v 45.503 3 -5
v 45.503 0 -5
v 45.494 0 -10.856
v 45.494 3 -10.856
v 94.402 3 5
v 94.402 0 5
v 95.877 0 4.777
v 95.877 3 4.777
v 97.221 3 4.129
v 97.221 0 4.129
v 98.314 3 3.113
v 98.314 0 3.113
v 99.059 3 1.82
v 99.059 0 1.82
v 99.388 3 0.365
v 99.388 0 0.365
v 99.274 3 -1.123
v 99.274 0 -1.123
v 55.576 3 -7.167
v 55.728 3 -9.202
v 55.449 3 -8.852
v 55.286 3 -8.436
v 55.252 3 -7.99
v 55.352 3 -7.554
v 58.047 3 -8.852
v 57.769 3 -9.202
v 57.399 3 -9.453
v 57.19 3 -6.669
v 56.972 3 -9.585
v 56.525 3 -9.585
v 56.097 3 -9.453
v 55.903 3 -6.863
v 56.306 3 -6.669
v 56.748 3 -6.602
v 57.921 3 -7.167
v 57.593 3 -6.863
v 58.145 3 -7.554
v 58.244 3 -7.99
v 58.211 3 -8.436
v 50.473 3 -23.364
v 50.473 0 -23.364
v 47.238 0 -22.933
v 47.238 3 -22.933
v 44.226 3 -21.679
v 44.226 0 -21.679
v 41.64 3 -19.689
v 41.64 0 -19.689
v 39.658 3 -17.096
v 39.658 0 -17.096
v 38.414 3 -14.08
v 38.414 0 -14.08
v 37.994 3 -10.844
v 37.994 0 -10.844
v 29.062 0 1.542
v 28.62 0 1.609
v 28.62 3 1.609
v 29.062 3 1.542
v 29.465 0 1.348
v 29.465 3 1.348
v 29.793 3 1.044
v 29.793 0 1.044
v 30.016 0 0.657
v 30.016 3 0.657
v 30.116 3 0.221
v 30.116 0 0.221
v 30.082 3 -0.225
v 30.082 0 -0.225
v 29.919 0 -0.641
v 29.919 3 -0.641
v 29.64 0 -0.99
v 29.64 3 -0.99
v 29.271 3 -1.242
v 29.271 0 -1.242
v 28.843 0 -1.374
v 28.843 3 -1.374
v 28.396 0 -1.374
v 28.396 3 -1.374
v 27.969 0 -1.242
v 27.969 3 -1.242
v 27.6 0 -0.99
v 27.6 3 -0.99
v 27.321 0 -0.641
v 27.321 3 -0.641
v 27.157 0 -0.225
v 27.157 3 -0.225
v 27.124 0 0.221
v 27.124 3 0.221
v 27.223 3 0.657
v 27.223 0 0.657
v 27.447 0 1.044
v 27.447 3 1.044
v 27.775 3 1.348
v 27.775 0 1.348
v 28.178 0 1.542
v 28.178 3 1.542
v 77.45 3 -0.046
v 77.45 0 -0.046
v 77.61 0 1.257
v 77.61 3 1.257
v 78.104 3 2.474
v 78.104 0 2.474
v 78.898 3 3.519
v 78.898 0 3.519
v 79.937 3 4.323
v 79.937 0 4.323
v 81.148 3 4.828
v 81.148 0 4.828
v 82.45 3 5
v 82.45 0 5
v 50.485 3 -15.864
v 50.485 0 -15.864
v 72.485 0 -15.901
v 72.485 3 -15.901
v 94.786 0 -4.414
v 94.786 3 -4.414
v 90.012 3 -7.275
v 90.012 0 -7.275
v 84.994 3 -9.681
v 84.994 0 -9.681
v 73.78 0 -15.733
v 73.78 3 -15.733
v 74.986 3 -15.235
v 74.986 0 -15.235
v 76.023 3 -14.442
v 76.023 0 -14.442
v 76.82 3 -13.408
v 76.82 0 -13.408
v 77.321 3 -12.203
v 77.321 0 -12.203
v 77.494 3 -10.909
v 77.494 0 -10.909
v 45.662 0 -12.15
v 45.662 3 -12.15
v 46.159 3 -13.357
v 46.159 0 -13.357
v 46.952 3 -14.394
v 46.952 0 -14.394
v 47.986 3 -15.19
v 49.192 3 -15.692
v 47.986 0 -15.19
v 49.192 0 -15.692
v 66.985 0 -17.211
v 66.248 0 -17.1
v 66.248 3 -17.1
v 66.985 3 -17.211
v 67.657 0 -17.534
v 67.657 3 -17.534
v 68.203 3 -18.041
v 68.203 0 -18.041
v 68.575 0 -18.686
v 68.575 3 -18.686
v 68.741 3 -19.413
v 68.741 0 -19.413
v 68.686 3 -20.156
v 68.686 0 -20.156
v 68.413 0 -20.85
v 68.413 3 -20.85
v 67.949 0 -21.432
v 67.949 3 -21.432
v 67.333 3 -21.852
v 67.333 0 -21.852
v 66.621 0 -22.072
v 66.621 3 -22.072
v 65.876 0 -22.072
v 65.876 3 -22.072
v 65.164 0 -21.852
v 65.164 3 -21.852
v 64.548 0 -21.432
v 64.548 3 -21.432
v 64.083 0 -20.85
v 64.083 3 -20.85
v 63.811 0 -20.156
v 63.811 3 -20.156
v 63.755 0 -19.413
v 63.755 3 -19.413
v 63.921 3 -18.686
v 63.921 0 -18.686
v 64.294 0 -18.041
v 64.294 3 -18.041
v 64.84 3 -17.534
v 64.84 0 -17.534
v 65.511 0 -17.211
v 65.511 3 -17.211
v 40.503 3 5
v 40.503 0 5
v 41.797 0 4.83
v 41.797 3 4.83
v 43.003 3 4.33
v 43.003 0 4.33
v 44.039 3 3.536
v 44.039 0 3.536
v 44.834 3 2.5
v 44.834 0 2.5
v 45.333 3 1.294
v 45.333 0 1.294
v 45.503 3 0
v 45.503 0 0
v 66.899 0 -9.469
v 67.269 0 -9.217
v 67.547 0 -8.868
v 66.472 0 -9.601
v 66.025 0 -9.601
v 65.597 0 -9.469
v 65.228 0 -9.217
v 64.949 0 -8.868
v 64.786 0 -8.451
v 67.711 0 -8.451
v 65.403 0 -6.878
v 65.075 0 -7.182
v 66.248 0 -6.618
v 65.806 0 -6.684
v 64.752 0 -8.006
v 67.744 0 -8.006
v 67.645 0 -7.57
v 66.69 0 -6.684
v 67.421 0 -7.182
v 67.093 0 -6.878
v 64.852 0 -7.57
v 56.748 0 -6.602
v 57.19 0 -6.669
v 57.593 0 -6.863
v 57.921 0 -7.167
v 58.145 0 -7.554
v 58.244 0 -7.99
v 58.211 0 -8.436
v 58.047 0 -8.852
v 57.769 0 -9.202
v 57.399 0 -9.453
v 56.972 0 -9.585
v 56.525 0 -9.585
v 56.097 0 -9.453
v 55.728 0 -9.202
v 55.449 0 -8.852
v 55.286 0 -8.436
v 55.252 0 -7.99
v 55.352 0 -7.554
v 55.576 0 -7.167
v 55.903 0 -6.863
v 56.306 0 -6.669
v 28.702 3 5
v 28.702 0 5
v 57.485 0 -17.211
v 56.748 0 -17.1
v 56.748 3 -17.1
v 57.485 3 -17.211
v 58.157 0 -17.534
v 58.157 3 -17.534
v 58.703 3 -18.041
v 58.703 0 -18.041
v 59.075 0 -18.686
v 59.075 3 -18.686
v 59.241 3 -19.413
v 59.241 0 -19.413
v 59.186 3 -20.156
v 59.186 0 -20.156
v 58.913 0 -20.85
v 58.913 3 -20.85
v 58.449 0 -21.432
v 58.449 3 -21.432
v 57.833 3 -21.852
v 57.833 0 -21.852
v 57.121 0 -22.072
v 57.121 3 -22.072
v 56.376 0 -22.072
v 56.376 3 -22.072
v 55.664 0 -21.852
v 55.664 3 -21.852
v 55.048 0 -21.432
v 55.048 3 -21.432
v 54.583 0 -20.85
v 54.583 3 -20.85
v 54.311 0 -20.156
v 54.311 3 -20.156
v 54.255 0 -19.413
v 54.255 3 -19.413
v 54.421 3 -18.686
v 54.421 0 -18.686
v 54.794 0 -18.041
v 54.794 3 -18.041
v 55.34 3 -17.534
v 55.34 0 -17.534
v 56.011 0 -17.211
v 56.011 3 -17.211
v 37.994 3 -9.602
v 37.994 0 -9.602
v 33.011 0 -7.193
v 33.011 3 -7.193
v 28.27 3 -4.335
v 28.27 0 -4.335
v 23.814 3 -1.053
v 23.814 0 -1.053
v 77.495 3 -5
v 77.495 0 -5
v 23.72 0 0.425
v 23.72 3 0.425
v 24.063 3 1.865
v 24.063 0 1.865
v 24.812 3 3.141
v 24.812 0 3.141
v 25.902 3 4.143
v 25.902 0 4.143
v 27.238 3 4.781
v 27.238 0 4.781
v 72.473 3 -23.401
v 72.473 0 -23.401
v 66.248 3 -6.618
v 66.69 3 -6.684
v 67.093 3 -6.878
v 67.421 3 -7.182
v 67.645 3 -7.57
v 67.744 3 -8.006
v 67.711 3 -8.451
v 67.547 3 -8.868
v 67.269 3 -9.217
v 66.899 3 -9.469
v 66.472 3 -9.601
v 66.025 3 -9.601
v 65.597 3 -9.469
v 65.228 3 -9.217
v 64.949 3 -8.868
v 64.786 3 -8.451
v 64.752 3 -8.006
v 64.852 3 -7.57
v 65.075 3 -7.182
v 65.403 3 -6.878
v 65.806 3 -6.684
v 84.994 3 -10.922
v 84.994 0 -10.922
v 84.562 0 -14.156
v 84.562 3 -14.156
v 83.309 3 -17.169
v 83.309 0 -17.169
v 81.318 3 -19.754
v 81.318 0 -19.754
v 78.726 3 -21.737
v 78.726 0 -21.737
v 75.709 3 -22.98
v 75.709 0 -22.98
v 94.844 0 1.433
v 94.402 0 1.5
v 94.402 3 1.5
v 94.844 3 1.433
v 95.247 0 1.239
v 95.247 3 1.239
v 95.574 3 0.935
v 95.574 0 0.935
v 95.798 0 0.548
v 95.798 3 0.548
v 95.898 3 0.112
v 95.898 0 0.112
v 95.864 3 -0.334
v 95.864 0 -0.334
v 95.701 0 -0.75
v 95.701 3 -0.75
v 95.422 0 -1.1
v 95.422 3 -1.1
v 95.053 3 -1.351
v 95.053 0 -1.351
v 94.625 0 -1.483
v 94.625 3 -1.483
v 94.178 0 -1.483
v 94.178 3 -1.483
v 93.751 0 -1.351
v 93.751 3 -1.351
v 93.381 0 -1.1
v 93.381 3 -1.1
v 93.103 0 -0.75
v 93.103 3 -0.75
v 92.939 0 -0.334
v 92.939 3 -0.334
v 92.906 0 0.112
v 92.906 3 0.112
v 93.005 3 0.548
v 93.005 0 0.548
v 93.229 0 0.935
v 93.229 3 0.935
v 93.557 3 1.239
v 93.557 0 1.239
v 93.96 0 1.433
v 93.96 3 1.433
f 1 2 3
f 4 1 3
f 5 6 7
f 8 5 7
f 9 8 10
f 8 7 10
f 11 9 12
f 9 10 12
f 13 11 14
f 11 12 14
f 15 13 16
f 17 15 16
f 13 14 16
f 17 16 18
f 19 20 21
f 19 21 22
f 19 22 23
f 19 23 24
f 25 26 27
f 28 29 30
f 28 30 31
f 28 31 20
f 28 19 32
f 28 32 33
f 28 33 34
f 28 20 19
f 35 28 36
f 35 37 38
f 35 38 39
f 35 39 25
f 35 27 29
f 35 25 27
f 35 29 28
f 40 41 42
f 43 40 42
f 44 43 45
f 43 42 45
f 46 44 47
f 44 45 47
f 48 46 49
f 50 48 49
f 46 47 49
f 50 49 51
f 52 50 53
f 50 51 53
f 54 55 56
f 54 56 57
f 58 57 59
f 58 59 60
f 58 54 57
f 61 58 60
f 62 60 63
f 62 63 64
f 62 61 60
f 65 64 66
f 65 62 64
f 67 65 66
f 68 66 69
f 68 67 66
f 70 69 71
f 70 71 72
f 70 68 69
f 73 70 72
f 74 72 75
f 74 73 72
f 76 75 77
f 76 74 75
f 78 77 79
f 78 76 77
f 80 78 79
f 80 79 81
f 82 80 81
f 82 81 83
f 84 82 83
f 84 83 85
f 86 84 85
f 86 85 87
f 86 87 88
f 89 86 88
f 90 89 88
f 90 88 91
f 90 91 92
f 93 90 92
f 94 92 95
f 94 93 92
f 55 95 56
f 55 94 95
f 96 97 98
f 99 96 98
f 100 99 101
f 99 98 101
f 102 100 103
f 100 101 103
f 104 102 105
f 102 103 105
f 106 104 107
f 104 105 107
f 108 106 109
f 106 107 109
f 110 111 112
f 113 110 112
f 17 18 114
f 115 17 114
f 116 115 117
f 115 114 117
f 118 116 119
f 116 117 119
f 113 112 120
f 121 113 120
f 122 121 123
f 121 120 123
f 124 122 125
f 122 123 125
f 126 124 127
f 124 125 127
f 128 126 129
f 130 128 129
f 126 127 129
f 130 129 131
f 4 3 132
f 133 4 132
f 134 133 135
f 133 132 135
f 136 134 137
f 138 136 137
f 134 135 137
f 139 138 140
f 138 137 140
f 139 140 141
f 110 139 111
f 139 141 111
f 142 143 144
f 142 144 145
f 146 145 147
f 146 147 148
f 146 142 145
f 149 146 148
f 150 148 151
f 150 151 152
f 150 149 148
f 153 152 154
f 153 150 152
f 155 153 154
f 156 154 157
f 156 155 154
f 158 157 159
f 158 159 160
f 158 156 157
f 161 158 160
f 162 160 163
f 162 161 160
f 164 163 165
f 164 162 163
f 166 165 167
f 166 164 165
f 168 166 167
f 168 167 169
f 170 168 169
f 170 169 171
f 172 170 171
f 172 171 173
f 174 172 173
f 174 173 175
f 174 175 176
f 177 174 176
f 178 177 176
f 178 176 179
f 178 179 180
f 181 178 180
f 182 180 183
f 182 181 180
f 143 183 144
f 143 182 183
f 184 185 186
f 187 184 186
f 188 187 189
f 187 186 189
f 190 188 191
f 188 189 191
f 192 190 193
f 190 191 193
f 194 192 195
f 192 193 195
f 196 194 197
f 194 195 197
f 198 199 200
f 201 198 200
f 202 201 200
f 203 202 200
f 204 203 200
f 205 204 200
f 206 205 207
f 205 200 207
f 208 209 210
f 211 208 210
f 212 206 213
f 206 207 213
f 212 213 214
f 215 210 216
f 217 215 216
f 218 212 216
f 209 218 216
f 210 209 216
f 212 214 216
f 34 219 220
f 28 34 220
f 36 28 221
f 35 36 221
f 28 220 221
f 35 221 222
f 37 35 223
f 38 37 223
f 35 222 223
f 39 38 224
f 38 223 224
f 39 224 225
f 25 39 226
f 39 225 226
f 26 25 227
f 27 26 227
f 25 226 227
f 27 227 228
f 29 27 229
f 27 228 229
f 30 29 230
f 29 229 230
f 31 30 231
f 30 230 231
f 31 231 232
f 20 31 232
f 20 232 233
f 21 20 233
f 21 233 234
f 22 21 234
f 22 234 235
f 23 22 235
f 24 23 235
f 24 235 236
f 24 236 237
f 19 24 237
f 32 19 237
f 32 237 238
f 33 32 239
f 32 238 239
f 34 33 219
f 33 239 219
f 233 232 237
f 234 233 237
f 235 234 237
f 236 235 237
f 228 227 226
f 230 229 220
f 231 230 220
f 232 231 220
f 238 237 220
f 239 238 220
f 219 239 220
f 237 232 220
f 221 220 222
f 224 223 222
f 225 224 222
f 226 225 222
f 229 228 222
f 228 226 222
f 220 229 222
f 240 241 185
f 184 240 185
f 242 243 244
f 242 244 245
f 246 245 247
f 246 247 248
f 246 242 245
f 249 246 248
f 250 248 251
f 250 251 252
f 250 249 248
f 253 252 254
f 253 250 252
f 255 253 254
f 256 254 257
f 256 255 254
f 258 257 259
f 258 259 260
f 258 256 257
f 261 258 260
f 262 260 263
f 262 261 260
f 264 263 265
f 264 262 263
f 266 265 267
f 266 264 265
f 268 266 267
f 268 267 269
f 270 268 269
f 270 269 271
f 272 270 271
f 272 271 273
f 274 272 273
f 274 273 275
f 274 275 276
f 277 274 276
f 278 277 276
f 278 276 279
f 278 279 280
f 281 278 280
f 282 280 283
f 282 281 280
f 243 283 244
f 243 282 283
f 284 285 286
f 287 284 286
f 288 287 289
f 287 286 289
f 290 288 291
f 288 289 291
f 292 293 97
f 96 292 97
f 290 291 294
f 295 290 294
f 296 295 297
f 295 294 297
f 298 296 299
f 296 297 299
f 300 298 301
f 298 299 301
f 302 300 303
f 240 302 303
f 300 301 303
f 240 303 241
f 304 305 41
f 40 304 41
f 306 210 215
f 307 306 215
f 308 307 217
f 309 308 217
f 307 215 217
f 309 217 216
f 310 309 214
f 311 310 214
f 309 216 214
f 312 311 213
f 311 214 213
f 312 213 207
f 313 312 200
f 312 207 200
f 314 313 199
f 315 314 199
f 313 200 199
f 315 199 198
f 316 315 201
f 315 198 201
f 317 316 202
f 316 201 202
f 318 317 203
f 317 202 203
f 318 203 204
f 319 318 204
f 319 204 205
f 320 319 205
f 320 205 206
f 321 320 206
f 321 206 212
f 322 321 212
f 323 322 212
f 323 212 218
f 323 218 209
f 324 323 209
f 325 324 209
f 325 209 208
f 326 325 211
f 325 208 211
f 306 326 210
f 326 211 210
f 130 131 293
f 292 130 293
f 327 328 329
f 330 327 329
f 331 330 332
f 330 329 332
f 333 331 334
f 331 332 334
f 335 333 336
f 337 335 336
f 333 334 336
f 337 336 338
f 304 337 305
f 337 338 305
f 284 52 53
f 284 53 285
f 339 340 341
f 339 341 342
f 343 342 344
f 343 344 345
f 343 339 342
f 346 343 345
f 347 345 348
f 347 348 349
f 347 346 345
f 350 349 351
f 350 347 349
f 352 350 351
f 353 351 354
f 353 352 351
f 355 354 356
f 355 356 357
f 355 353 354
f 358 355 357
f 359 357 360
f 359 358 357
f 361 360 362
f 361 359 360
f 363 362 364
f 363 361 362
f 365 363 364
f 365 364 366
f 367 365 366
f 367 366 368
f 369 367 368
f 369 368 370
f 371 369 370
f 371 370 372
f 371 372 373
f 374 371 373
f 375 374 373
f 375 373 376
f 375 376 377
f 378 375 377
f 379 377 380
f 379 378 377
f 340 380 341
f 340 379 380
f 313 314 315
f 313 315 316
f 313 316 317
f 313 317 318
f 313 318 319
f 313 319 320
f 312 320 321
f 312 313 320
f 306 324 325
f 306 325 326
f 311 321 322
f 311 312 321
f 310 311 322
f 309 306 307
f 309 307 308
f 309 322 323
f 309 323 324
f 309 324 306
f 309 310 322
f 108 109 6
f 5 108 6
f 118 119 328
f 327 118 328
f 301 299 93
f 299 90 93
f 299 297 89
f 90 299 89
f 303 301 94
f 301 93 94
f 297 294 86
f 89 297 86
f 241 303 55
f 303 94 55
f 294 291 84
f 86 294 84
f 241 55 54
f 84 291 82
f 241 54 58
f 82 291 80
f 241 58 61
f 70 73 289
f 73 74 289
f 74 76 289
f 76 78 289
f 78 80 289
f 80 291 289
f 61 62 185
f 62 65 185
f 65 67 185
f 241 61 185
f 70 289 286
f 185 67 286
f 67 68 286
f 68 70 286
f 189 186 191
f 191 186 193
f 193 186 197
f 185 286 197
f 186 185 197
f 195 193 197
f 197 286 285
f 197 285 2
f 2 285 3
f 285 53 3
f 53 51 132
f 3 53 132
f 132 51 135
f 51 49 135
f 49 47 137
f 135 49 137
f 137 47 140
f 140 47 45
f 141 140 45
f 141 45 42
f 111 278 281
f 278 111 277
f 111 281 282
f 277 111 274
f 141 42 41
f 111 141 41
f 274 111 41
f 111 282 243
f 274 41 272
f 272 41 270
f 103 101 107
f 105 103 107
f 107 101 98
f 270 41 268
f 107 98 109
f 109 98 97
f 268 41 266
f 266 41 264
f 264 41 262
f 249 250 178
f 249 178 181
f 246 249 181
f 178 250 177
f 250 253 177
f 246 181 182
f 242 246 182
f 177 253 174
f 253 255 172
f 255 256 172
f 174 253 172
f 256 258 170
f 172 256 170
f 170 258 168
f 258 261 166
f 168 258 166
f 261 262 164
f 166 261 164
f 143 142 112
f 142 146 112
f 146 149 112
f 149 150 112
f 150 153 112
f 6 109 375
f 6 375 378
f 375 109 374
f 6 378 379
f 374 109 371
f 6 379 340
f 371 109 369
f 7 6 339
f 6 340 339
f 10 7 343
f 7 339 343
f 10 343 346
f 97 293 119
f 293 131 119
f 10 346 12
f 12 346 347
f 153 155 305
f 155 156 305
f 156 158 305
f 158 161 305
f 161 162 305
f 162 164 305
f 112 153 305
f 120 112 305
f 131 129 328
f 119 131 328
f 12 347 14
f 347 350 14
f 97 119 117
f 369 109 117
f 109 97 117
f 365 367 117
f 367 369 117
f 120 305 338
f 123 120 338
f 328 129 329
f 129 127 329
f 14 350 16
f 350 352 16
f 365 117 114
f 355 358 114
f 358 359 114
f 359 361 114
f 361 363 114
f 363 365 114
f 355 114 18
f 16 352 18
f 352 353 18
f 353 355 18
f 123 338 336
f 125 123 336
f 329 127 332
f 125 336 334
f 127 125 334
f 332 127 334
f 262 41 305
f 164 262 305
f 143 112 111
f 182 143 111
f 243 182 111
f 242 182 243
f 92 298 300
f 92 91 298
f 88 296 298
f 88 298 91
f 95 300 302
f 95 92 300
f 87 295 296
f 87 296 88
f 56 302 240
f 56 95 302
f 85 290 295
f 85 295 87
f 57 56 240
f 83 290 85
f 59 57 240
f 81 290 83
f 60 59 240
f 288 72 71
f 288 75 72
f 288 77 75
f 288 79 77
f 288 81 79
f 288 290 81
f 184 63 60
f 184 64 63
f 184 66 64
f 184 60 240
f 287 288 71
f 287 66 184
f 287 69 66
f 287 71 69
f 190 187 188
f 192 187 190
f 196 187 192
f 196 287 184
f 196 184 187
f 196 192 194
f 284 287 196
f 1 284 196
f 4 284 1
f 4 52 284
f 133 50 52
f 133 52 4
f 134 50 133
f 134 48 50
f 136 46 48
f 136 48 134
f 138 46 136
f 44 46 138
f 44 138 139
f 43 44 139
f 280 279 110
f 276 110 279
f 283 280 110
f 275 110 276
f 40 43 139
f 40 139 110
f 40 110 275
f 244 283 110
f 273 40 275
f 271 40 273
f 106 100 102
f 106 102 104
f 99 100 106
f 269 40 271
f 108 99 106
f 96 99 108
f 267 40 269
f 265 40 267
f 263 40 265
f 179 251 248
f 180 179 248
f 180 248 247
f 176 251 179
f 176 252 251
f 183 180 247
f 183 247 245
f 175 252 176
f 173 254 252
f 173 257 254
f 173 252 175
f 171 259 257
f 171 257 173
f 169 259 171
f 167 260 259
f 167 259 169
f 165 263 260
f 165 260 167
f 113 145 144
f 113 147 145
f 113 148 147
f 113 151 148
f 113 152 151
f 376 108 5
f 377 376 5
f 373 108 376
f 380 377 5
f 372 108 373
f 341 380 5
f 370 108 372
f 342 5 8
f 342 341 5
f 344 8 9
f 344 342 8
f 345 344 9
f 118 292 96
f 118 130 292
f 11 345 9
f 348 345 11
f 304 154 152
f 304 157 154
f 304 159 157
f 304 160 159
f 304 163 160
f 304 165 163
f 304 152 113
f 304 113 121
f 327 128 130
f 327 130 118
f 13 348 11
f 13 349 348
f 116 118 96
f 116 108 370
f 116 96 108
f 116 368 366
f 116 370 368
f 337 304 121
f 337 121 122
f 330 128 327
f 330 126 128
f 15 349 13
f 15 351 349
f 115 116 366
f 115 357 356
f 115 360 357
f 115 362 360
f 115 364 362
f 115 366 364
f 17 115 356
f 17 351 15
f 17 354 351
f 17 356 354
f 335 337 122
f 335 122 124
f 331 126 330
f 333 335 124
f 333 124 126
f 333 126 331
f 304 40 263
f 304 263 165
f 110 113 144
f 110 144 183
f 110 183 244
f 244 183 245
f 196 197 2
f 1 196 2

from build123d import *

# Parameters (mm, degrees)
CROQUIS1_R                = 1.5
SALIENTE_EXTRUIR1_DEPTH   = 3
SALIENTE_EXTRUIR1_2_DEPTH = 3
CROQUIS1_R_2              = 2.5
SALIENTE_EXTRUIR1_3_DEPTH = 3


with BuildPart() as part:
    # Croquis1 → Saliente-Extruir1 (new body)
    with BuildSketch(Plane(origin=(0, 0, 0), x_dir=(1, 0, 0), z_dir=(0, 1, 0))):
        with Locations(Location((56.748254661, 8.101959086, 0), (0, 0, 270))):
            Circle(CROQUIS1_R)
    extrude(amount=SALIENTE_EXTRUIR1_DEPTH)


with BuildPart() as body_2:
    # Croquis1 → Saliente-Extruir1 2 (new body)
    with BuildSketch(Plane(origin=(0, 0, 0), x_dir=(1, 0, 0), z_dir=(0, 1, 0))):
        with Locations(Location((66.248241595, 8.117715552, 0), (0, 0, 270))):
            Circle(CROQUIS1_R)
    extrude(amount=SALIENTE_EXTRUIR1_2_DEPTH)


with BuildPart() as body_3:
    # Croquis1 → Saliente-Extruir1 3 (new body)
    with BuildSketch(Plane(origin=(0, 0, 0), x_dir=(1, 0, 0), z_dir=(0, 1, 0))):
        with BuildLine():
            Line((77.495135153, 5), (77.449947836, 0.045601335))
            ThreePointArc((77.449947836, 0.045601335), (78.898120064, -3.51937447), (82.449739883, -5))
            Line((82.449739883, -5), (94.40174416, -5))
            ThreePointArc((94.40174416, -5), (98.31410499, -3.113427811), (99.274085367, 1.122626905))
            ThreePointArc((99.274085367, 1.122626905), (92.432310502, 5.899717334), (84.993937094, 9.681393854))
            Line((84.993937094, 9.681393854), (84.993616976, 10.921568689))
            ThreePointArc((84.993616976, 10.921568689), (81.317796903, 19.754318979), (72.472901978, 23.400819305))
            Line((72.472901978, 23.400819305), (50.472932237, 23.364330648))
            ThreePointArc((50.472932237, 23.364330648), (41.640181948, 19.688510575), (37.993681622, 10.84361565))
            Line((37.993681622, 10.84361565), (37.993978927, 9.601951381))
            ThreePointArc((37.993978927, 9.601951381), (30.607541127, 5.818750528), (23.813780611, 1.052526644))
            ThreePointArc((23.813780611, 1.052526644), (24.811844855, -3.141446067), (28.70174416, -5))
            Line((28.70174416, -5), (40.503384027, -5))
            ThreePointArc((40.503384027, -5), (44.038917933, -3.535533906), (45.503384027, 0))
            Line((45.503384027, 0), (45.503384027, 5))
            Line((45.503384027, 5), (45.493671306, 10.856054964))
            ThreePointArc((45.493671306, 10.856054964), (46.952271436, 14.394012935), (50.485371552, 15.864340964))
            Line((50.485371552, 15.864340964), (72.485341292, 15.900829621))
            ThreePointArc((72.485341292, 15.900829621), (76.023299263, 14.44222949), (77.493627292, 10.909129374))
            Line((77.493627292, 10.909129374), (77.495135153, 5))
        make_face()
        with Locations(Location((56.748254661, 19.599780569, 0), (0, 0, 270))):
            Circle(CROQUIS1_R_2, mode=Mode.SUBTRACT)
        with Locations(Location((66.248241595, 19.599780569, 0), (0, 0, 270))):
            Circle(CROQUIS1_R_2, mode=Mode.SUBTRACT)
        with Locations(Location((28.619794204, -0.109104468, 0), (0, 0, 270))):
            Circle(CROQUIS1_R, mode=Mode.SUBTRACT)
        with Locations(Location((94.401744161, 0, 0), (0, 0, 270))):
            Circle(CROQUIS1_R, mode=Mode.SUBTRACT)
    extrude(amount=SALIENTE_EXTRUIR1_3_DEPTH)


solid = Compound([part.part, body_2.part, body_3.part])
